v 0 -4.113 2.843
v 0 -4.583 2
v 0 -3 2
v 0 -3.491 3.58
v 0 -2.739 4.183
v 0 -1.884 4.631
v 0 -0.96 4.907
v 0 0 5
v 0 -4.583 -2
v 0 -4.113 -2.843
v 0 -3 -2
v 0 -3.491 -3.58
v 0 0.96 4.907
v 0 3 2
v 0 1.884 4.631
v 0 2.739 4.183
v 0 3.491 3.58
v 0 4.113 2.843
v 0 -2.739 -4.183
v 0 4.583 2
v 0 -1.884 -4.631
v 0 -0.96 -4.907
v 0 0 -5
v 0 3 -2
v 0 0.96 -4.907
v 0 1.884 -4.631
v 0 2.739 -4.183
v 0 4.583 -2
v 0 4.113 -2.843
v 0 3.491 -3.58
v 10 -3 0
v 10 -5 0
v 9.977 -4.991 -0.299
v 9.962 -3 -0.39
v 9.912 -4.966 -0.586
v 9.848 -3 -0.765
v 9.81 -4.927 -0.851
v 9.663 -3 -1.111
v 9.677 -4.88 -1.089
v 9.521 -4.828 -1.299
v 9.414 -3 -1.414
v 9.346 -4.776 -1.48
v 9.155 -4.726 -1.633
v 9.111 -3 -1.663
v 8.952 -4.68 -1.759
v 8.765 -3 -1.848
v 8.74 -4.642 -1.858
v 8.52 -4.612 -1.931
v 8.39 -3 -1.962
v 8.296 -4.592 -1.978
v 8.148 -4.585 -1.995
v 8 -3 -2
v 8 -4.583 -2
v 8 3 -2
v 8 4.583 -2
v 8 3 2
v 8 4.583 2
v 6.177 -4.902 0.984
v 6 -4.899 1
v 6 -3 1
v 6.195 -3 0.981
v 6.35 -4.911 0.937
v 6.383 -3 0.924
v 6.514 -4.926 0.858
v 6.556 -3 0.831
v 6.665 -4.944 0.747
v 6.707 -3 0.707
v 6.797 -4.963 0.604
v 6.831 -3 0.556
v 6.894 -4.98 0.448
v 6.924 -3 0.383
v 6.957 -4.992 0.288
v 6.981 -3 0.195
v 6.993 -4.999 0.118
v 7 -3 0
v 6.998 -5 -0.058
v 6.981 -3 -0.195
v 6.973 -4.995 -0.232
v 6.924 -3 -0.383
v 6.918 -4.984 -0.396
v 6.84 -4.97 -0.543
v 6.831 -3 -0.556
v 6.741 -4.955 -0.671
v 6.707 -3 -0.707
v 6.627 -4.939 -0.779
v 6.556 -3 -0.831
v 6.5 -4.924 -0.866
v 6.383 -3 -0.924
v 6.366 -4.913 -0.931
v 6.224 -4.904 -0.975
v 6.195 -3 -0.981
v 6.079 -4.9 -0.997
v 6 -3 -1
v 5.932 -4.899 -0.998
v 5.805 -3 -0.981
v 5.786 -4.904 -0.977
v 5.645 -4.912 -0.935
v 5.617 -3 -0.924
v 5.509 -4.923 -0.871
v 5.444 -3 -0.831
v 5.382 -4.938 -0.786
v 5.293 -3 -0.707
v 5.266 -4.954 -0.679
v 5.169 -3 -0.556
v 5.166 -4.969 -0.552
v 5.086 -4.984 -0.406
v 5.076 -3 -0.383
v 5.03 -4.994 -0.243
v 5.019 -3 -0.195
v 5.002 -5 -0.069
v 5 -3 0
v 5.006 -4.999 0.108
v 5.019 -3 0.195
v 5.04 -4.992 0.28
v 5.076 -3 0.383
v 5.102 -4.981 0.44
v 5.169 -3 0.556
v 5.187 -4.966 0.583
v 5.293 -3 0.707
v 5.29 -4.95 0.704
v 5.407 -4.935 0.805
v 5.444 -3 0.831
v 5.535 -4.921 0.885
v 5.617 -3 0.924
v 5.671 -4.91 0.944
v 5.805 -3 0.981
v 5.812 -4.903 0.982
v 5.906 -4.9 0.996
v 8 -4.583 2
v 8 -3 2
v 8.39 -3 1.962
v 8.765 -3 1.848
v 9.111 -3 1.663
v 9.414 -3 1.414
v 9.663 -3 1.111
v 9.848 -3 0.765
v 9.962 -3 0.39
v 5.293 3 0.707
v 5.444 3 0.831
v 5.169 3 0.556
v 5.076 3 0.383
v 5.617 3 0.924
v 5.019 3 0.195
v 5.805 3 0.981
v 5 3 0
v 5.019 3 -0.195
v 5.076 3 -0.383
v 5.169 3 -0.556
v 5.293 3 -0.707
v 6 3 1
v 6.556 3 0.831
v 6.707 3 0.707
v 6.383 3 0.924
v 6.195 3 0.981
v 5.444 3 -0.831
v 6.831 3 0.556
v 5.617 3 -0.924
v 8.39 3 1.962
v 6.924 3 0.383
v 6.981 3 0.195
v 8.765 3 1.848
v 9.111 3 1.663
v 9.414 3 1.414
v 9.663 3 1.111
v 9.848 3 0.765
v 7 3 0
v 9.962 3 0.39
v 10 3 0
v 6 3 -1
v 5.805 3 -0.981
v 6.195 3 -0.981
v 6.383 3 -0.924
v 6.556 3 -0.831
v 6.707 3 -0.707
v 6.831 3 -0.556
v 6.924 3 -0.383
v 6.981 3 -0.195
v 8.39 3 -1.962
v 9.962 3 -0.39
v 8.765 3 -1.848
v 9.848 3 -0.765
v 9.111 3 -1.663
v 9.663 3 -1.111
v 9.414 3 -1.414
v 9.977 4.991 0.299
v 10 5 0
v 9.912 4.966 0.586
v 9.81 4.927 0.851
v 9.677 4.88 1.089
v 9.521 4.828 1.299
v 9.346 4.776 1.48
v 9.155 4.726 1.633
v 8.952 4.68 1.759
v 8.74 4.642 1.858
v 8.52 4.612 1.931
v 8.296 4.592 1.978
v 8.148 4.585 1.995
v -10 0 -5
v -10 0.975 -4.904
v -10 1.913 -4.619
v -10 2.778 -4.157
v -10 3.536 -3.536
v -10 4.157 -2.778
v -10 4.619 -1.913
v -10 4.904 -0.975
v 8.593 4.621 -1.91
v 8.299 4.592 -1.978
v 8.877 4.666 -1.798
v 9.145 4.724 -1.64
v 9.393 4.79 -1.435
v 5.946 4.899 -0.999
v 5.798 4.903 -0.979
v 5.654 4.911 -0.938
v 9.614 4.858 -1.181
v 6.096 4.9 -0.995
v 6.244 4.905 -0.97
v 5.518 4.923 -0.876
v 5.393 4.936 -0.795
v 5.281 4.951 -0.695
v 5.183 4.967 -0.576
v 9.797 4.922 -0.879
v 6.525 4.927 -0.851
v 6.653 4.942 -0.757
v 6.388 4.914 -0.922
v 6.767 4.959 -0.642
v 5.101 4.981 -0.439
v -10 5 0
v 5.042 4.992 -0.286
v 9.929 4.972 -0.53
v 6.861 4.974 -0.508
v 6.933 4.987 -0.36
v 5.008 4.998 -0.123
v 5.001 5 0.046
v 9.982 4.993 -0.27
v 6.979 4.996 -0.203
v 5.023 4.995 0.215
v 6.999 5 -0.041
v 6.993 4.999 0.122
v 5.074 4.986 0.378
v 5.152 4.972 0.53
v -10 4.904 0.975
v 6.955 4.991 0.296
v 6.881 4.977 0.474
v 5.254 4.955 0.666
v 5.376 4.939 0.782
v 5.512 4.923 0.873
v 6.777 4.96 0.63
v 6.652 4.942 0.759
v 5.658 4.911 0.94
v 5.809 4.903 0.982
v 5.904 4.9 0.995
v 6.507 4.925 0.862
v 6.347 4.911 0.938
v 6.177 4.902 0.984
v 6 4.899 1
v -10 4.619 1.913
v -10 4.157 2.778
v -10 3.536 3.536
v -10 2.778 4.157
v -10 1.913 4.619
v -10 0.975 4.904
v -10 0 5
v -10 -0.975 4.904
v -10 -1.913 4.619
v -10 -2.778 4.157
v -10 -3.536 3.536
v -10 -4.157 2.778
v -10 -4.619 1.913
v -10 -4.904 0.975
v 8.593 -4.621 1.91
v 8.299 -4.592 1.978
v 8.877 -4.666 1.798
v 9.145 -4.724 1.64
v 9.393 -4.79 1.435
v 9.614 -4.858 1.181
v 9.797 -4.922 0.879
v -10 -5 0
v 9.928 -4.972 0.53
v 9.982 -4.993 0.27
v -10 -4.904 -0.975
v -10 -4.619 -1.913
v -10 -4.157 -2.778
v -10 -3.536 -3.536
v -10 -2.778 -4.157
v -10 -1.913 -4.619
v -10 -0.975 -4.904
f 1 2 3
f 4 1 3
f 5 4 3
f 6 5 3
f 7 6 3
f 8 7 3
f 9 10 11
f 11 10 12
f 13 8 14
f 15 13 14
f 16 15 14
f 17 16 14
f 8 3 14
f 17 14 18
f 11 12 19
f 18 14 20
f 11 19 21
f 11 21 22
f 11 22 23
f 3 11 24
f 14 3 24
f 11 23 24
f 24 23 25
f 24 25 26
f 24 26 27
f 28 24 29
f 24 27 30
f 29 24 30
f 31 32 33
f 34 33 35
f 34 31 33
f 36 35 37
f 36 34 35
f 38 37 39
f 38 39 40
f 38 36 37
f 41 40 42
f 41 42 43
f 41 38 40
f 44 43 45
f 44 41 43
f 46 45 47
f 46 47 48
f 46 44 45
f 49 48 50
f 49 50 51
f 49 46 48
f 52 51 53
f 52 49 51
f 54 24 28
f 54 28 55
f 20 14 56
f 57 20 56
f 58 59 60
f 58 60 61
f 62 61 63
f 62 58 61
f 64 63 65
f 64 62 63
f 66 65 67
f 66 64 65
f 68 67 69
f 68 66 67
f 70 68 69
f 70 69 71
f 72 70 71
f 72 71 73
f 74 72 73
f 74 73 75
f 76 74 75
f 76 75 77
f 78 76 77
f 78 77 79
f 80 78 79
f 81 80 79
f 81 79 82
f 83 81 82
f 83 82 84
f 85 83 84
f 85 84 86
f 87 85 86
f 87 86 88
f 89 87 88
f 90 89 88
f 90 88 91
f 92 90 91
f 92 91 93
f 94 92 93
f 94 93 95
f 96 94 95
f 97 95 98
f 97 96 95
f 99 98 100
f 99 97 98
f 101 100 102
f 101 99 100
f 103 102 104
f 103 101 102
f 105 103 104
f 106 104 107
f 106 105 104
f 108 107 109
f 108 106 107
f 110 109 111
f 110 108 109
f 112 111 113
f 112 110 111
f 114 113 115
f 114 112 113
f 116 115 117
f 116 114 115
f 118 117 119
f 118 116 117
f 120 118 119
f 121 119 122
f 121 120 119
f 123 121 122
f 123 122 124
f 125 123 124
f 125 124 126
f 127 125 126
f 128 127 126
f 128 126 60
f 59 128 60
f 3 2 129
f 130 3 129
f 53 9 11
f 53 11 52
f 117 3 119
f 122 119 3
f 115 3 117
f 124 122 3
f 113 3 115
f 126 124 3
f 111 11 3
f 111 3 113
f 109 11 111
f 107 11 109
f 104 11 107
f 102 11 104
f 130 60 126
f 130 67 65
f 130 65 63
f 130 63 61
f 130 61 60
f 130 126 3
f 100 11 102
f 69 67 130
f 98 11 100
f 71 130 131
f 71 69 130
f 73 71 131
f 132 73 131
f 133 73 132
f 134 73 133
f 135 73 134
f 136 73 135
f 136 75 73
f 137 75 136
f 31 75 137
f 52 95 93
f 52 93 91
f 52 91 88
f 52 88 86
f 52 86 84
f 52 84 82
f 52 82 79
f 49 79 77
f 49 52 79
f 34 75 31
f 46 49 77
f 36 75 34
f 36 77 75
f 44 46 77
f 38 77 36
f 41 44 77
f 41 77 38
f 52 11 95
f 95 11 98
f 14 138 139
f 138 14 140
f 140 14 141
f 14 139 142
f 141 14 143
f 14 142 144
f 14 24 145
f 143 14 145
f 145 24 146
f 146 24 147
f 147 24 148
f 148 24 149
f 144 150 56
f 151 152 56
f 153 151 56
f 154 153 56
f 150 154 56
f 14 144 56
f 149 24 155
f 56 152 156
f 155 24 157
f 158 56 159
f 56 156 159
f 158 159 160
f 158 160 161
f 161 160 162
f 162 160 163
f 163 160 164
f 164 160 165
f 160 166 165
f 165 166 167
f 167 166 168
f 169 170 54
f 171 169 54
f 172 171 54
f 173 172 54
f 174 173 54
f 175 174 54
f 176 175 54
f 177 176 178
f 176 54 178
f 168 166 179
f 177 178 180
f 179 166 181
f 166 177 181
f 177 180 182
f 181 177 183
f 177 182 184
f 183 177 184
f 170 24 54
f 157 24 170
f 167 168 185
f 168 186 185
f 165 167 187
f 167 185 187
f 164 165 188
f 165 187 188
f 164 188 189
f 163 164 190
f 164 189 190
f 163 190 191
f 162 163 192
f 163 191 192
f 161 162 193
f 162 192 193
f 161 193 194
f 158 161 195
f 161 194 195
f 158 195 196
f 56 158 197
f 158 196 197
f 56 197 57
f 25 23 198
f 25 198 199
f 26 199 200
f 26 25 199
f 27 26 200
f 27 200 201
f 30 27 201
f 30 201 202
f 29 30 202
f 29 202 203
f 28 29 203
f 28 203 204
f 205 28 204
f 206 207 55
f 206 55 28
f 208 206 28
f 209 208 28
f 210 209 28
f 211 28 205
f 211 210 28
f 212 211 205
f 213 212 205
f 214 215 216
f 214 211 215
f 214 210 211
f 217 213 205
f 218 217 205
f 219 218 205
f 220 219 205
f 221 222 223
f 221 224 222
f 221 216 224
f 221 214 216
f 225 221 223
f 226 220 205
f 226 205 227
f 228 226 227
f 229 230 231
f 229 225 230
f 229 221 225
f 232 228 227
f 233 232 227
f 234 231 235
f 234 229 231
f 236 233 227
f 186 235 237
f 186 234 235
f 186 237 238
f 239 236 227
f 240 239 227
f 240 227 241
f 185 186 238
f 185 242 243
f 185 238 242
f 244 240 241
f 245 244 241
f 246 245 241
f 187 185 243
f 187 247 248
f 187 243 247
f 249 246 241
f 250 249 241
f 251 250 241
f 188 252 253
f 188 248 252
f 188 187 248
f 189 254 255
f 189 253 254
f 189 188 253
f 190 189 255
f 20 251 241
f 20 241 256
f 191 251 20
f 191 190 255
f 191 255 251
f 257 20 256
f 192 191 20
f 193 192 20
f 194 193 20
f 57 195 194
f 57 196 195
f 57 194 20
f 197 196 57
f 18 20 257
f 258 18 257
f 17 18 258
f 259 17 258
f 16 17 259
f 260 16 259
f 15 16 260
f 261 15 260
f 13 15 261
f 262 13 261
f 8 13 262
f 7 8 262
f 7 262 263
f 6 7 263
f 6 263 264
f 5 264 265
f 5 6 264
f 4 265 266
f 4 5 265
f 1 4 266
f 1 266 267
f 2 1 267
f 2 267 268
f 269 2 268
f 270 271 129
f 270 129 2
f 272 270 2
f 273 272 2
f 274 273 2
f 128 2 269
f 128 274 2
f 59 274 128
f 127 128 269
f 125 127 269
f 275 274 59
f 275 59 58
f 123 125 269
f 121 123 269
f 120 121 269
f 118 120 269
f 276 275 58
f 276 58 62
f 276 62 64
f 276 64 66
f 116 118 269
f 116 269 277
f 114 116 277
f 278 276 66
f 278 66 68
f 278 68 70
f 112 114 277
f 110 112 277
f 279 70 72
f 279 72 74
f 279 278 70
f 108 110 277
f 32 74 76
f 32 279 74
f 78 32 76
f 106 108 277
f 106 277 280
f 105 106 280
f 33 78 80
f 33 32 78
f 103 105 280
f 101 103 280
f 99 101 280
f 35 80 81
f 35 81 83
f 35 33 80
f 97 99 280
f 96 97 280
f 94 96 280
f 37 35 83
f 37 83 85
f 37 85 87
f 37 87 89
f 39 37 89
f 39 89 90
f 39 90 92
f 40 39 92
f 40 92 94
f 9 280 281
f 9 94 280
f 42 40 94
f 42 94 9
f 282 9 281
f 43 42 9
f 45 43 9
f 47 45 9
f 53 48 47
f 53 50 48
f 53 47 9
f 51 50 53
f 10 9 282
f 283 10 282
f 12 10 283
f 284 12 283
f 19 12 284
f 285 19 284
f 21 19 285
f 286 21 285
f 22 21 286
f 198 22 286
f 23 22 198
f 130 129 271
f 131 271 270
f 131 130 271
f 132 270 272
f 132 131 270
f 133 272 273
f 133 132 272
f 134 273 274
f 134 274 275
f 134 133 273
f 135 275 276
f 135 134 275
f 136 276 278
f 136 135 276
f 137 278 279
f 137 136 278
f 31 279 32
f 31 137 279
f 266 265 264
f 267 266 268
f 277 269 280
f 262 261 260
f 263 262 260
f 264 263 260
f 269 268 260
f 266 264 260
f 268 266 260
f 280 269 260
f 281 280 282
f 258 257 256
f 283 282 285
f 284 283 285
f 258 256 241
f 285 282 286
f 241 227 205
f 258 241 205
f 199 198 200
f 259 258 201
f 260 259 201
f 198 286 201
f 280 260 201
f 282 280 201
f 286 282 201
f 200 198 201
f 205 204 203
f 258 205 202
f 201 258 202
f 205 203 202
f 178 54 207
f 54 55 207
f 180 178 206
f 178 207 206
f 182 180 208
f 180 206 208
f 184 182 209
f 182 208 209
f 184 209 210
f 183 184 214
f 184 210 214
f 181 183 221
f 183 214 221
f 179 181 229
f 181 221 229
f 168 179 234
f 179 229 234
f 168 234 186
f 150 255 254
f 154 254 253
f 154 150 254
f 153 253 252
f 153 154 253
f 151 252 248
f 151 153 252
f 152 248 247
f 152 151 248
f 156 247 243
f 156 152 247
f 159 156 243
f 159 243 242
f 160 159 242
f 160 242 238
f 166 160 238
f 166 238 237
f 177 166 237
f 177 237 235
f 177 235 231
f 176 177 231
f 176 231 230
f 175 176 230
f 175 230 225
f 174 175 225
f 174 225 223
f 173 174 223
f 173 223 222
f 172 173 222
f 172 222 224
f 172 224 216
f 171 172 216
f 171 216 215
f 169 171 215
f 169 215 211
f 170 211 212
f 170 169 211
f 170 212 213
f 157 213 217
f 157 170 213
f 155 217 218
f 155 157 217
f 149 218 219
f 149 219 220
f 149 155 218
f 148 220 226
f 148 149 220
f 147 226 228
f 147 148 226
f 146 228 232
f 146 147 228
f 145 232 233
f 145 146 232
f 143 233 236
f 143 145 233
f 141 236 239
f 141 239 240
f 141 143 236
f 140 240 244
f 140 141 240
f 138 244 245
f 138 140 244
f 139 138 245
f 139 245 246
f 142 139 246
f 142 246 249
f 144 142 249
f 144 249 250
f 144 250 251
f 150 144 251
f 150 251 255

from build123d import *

# Parameters (mm, degrees)
SKIZZE7_R                            = 5
AUFSATZ_LINEAR_AUSTRAGEN4_DEPTH      = 10
SCHNITT_LINEAR_AUSTRAGEN2_DEPTH      = 13.247448714
SCHNITT_LINEAR_AUSTRAGEN2_DEPTH_BACK = 13.247448714
SKIZZE8_W                            = 10
SKIZZE8_H                            = 6
SCHNITT_LINEAR_AUSTRAGEN3_DEPTH      = 13.247448714
SCHNITT_LINEAR_AUSTRAGEN3_DEPTH_BACK = 13.247448714
SKIZZE5_R                            = 1
SKIZZE5_W                            = 10
SKIZZE5_H                            = 3
VERRUNDUNG1_R                        = 2


with BuildPart() as part:
    # Skizze7 → Aufsatz-Linear austragen4 (new, symmetric)
    with BuildSketch(Plane(origin=(0, 0, 0), x_dir=(0, 0, -1), z_dir=(1, 0, 0))):
        Circle(SKIZZE7_R)
    extrude(amount=AUFSATZ_LINEAR_AUSTRAGEN4_DEPTH, both=True)

    # Skizze8 → Schnitt-Linear austragen2 (cut, two sides: drawn at the far end of the back side and taken through both)
    with BuildSketch(Plane.XY.offset(-SCHNITT_LINEAR_AUSTRAGEN2_DEPTH_BACK)):
        with Locations((5, 0)):
            Rectangle(SKIZZE8_W, SKIZZE8_H)
    extrude(amount=SCHNITT_LINEAR_AUSTRAGEN2_DEPTH + SCHNITT_LINEAR_AUSTRAGEN2_DEPTH_BACK, mode=Mode.SUBTRACT)

    # Skizze5 → Schnitt-Linear austragen3 (cut, two sides: drawn at the far end of the back side and taken through both)
    with BuildSketch(Plane(origin=(0, 0, 0), x_dir=(1, 0, 0), z_dir=(0, 1, 0)).offset(-SCHNITT_LINEAR_AUSTRAGEN3_DEPTH_BACK)):
        with Locations(Location((6, 0, 0), (0, 0, 270))):
            Circle(SKIZZE5_R)
        with Locations((5, 3.5)):
            Rectangle(SKIZZE5_W, SKIZZE5_H)
        with Locations((5, -3.5)):
            Rectangle(SKIZZE5_W, SKIZZE5_H)
    extrude(amount=SCHNITT_LINEAR_AUSTRAGEN3_DEPTH + SCHNITT_LINEAR_AUSTRAGEN3_DEPTH_BACK, mode=Mode.SUBTRACT)

    # Verrundung1
    verrundung1_edges = [part.edges().sort_by_distance(p)[0] for p in [
        (10, -3.791287847, -2),
        (10, -3.791287847, 2),
        (10, 3.791287847, -2),
        (10, 3.791287847, 2),
    ]]
    fillet(verrundung1_edges, radius=VERRUNDUNG1_R - 0.0001)  # a hair under: the kernel refuses the full size


solid = part.part
